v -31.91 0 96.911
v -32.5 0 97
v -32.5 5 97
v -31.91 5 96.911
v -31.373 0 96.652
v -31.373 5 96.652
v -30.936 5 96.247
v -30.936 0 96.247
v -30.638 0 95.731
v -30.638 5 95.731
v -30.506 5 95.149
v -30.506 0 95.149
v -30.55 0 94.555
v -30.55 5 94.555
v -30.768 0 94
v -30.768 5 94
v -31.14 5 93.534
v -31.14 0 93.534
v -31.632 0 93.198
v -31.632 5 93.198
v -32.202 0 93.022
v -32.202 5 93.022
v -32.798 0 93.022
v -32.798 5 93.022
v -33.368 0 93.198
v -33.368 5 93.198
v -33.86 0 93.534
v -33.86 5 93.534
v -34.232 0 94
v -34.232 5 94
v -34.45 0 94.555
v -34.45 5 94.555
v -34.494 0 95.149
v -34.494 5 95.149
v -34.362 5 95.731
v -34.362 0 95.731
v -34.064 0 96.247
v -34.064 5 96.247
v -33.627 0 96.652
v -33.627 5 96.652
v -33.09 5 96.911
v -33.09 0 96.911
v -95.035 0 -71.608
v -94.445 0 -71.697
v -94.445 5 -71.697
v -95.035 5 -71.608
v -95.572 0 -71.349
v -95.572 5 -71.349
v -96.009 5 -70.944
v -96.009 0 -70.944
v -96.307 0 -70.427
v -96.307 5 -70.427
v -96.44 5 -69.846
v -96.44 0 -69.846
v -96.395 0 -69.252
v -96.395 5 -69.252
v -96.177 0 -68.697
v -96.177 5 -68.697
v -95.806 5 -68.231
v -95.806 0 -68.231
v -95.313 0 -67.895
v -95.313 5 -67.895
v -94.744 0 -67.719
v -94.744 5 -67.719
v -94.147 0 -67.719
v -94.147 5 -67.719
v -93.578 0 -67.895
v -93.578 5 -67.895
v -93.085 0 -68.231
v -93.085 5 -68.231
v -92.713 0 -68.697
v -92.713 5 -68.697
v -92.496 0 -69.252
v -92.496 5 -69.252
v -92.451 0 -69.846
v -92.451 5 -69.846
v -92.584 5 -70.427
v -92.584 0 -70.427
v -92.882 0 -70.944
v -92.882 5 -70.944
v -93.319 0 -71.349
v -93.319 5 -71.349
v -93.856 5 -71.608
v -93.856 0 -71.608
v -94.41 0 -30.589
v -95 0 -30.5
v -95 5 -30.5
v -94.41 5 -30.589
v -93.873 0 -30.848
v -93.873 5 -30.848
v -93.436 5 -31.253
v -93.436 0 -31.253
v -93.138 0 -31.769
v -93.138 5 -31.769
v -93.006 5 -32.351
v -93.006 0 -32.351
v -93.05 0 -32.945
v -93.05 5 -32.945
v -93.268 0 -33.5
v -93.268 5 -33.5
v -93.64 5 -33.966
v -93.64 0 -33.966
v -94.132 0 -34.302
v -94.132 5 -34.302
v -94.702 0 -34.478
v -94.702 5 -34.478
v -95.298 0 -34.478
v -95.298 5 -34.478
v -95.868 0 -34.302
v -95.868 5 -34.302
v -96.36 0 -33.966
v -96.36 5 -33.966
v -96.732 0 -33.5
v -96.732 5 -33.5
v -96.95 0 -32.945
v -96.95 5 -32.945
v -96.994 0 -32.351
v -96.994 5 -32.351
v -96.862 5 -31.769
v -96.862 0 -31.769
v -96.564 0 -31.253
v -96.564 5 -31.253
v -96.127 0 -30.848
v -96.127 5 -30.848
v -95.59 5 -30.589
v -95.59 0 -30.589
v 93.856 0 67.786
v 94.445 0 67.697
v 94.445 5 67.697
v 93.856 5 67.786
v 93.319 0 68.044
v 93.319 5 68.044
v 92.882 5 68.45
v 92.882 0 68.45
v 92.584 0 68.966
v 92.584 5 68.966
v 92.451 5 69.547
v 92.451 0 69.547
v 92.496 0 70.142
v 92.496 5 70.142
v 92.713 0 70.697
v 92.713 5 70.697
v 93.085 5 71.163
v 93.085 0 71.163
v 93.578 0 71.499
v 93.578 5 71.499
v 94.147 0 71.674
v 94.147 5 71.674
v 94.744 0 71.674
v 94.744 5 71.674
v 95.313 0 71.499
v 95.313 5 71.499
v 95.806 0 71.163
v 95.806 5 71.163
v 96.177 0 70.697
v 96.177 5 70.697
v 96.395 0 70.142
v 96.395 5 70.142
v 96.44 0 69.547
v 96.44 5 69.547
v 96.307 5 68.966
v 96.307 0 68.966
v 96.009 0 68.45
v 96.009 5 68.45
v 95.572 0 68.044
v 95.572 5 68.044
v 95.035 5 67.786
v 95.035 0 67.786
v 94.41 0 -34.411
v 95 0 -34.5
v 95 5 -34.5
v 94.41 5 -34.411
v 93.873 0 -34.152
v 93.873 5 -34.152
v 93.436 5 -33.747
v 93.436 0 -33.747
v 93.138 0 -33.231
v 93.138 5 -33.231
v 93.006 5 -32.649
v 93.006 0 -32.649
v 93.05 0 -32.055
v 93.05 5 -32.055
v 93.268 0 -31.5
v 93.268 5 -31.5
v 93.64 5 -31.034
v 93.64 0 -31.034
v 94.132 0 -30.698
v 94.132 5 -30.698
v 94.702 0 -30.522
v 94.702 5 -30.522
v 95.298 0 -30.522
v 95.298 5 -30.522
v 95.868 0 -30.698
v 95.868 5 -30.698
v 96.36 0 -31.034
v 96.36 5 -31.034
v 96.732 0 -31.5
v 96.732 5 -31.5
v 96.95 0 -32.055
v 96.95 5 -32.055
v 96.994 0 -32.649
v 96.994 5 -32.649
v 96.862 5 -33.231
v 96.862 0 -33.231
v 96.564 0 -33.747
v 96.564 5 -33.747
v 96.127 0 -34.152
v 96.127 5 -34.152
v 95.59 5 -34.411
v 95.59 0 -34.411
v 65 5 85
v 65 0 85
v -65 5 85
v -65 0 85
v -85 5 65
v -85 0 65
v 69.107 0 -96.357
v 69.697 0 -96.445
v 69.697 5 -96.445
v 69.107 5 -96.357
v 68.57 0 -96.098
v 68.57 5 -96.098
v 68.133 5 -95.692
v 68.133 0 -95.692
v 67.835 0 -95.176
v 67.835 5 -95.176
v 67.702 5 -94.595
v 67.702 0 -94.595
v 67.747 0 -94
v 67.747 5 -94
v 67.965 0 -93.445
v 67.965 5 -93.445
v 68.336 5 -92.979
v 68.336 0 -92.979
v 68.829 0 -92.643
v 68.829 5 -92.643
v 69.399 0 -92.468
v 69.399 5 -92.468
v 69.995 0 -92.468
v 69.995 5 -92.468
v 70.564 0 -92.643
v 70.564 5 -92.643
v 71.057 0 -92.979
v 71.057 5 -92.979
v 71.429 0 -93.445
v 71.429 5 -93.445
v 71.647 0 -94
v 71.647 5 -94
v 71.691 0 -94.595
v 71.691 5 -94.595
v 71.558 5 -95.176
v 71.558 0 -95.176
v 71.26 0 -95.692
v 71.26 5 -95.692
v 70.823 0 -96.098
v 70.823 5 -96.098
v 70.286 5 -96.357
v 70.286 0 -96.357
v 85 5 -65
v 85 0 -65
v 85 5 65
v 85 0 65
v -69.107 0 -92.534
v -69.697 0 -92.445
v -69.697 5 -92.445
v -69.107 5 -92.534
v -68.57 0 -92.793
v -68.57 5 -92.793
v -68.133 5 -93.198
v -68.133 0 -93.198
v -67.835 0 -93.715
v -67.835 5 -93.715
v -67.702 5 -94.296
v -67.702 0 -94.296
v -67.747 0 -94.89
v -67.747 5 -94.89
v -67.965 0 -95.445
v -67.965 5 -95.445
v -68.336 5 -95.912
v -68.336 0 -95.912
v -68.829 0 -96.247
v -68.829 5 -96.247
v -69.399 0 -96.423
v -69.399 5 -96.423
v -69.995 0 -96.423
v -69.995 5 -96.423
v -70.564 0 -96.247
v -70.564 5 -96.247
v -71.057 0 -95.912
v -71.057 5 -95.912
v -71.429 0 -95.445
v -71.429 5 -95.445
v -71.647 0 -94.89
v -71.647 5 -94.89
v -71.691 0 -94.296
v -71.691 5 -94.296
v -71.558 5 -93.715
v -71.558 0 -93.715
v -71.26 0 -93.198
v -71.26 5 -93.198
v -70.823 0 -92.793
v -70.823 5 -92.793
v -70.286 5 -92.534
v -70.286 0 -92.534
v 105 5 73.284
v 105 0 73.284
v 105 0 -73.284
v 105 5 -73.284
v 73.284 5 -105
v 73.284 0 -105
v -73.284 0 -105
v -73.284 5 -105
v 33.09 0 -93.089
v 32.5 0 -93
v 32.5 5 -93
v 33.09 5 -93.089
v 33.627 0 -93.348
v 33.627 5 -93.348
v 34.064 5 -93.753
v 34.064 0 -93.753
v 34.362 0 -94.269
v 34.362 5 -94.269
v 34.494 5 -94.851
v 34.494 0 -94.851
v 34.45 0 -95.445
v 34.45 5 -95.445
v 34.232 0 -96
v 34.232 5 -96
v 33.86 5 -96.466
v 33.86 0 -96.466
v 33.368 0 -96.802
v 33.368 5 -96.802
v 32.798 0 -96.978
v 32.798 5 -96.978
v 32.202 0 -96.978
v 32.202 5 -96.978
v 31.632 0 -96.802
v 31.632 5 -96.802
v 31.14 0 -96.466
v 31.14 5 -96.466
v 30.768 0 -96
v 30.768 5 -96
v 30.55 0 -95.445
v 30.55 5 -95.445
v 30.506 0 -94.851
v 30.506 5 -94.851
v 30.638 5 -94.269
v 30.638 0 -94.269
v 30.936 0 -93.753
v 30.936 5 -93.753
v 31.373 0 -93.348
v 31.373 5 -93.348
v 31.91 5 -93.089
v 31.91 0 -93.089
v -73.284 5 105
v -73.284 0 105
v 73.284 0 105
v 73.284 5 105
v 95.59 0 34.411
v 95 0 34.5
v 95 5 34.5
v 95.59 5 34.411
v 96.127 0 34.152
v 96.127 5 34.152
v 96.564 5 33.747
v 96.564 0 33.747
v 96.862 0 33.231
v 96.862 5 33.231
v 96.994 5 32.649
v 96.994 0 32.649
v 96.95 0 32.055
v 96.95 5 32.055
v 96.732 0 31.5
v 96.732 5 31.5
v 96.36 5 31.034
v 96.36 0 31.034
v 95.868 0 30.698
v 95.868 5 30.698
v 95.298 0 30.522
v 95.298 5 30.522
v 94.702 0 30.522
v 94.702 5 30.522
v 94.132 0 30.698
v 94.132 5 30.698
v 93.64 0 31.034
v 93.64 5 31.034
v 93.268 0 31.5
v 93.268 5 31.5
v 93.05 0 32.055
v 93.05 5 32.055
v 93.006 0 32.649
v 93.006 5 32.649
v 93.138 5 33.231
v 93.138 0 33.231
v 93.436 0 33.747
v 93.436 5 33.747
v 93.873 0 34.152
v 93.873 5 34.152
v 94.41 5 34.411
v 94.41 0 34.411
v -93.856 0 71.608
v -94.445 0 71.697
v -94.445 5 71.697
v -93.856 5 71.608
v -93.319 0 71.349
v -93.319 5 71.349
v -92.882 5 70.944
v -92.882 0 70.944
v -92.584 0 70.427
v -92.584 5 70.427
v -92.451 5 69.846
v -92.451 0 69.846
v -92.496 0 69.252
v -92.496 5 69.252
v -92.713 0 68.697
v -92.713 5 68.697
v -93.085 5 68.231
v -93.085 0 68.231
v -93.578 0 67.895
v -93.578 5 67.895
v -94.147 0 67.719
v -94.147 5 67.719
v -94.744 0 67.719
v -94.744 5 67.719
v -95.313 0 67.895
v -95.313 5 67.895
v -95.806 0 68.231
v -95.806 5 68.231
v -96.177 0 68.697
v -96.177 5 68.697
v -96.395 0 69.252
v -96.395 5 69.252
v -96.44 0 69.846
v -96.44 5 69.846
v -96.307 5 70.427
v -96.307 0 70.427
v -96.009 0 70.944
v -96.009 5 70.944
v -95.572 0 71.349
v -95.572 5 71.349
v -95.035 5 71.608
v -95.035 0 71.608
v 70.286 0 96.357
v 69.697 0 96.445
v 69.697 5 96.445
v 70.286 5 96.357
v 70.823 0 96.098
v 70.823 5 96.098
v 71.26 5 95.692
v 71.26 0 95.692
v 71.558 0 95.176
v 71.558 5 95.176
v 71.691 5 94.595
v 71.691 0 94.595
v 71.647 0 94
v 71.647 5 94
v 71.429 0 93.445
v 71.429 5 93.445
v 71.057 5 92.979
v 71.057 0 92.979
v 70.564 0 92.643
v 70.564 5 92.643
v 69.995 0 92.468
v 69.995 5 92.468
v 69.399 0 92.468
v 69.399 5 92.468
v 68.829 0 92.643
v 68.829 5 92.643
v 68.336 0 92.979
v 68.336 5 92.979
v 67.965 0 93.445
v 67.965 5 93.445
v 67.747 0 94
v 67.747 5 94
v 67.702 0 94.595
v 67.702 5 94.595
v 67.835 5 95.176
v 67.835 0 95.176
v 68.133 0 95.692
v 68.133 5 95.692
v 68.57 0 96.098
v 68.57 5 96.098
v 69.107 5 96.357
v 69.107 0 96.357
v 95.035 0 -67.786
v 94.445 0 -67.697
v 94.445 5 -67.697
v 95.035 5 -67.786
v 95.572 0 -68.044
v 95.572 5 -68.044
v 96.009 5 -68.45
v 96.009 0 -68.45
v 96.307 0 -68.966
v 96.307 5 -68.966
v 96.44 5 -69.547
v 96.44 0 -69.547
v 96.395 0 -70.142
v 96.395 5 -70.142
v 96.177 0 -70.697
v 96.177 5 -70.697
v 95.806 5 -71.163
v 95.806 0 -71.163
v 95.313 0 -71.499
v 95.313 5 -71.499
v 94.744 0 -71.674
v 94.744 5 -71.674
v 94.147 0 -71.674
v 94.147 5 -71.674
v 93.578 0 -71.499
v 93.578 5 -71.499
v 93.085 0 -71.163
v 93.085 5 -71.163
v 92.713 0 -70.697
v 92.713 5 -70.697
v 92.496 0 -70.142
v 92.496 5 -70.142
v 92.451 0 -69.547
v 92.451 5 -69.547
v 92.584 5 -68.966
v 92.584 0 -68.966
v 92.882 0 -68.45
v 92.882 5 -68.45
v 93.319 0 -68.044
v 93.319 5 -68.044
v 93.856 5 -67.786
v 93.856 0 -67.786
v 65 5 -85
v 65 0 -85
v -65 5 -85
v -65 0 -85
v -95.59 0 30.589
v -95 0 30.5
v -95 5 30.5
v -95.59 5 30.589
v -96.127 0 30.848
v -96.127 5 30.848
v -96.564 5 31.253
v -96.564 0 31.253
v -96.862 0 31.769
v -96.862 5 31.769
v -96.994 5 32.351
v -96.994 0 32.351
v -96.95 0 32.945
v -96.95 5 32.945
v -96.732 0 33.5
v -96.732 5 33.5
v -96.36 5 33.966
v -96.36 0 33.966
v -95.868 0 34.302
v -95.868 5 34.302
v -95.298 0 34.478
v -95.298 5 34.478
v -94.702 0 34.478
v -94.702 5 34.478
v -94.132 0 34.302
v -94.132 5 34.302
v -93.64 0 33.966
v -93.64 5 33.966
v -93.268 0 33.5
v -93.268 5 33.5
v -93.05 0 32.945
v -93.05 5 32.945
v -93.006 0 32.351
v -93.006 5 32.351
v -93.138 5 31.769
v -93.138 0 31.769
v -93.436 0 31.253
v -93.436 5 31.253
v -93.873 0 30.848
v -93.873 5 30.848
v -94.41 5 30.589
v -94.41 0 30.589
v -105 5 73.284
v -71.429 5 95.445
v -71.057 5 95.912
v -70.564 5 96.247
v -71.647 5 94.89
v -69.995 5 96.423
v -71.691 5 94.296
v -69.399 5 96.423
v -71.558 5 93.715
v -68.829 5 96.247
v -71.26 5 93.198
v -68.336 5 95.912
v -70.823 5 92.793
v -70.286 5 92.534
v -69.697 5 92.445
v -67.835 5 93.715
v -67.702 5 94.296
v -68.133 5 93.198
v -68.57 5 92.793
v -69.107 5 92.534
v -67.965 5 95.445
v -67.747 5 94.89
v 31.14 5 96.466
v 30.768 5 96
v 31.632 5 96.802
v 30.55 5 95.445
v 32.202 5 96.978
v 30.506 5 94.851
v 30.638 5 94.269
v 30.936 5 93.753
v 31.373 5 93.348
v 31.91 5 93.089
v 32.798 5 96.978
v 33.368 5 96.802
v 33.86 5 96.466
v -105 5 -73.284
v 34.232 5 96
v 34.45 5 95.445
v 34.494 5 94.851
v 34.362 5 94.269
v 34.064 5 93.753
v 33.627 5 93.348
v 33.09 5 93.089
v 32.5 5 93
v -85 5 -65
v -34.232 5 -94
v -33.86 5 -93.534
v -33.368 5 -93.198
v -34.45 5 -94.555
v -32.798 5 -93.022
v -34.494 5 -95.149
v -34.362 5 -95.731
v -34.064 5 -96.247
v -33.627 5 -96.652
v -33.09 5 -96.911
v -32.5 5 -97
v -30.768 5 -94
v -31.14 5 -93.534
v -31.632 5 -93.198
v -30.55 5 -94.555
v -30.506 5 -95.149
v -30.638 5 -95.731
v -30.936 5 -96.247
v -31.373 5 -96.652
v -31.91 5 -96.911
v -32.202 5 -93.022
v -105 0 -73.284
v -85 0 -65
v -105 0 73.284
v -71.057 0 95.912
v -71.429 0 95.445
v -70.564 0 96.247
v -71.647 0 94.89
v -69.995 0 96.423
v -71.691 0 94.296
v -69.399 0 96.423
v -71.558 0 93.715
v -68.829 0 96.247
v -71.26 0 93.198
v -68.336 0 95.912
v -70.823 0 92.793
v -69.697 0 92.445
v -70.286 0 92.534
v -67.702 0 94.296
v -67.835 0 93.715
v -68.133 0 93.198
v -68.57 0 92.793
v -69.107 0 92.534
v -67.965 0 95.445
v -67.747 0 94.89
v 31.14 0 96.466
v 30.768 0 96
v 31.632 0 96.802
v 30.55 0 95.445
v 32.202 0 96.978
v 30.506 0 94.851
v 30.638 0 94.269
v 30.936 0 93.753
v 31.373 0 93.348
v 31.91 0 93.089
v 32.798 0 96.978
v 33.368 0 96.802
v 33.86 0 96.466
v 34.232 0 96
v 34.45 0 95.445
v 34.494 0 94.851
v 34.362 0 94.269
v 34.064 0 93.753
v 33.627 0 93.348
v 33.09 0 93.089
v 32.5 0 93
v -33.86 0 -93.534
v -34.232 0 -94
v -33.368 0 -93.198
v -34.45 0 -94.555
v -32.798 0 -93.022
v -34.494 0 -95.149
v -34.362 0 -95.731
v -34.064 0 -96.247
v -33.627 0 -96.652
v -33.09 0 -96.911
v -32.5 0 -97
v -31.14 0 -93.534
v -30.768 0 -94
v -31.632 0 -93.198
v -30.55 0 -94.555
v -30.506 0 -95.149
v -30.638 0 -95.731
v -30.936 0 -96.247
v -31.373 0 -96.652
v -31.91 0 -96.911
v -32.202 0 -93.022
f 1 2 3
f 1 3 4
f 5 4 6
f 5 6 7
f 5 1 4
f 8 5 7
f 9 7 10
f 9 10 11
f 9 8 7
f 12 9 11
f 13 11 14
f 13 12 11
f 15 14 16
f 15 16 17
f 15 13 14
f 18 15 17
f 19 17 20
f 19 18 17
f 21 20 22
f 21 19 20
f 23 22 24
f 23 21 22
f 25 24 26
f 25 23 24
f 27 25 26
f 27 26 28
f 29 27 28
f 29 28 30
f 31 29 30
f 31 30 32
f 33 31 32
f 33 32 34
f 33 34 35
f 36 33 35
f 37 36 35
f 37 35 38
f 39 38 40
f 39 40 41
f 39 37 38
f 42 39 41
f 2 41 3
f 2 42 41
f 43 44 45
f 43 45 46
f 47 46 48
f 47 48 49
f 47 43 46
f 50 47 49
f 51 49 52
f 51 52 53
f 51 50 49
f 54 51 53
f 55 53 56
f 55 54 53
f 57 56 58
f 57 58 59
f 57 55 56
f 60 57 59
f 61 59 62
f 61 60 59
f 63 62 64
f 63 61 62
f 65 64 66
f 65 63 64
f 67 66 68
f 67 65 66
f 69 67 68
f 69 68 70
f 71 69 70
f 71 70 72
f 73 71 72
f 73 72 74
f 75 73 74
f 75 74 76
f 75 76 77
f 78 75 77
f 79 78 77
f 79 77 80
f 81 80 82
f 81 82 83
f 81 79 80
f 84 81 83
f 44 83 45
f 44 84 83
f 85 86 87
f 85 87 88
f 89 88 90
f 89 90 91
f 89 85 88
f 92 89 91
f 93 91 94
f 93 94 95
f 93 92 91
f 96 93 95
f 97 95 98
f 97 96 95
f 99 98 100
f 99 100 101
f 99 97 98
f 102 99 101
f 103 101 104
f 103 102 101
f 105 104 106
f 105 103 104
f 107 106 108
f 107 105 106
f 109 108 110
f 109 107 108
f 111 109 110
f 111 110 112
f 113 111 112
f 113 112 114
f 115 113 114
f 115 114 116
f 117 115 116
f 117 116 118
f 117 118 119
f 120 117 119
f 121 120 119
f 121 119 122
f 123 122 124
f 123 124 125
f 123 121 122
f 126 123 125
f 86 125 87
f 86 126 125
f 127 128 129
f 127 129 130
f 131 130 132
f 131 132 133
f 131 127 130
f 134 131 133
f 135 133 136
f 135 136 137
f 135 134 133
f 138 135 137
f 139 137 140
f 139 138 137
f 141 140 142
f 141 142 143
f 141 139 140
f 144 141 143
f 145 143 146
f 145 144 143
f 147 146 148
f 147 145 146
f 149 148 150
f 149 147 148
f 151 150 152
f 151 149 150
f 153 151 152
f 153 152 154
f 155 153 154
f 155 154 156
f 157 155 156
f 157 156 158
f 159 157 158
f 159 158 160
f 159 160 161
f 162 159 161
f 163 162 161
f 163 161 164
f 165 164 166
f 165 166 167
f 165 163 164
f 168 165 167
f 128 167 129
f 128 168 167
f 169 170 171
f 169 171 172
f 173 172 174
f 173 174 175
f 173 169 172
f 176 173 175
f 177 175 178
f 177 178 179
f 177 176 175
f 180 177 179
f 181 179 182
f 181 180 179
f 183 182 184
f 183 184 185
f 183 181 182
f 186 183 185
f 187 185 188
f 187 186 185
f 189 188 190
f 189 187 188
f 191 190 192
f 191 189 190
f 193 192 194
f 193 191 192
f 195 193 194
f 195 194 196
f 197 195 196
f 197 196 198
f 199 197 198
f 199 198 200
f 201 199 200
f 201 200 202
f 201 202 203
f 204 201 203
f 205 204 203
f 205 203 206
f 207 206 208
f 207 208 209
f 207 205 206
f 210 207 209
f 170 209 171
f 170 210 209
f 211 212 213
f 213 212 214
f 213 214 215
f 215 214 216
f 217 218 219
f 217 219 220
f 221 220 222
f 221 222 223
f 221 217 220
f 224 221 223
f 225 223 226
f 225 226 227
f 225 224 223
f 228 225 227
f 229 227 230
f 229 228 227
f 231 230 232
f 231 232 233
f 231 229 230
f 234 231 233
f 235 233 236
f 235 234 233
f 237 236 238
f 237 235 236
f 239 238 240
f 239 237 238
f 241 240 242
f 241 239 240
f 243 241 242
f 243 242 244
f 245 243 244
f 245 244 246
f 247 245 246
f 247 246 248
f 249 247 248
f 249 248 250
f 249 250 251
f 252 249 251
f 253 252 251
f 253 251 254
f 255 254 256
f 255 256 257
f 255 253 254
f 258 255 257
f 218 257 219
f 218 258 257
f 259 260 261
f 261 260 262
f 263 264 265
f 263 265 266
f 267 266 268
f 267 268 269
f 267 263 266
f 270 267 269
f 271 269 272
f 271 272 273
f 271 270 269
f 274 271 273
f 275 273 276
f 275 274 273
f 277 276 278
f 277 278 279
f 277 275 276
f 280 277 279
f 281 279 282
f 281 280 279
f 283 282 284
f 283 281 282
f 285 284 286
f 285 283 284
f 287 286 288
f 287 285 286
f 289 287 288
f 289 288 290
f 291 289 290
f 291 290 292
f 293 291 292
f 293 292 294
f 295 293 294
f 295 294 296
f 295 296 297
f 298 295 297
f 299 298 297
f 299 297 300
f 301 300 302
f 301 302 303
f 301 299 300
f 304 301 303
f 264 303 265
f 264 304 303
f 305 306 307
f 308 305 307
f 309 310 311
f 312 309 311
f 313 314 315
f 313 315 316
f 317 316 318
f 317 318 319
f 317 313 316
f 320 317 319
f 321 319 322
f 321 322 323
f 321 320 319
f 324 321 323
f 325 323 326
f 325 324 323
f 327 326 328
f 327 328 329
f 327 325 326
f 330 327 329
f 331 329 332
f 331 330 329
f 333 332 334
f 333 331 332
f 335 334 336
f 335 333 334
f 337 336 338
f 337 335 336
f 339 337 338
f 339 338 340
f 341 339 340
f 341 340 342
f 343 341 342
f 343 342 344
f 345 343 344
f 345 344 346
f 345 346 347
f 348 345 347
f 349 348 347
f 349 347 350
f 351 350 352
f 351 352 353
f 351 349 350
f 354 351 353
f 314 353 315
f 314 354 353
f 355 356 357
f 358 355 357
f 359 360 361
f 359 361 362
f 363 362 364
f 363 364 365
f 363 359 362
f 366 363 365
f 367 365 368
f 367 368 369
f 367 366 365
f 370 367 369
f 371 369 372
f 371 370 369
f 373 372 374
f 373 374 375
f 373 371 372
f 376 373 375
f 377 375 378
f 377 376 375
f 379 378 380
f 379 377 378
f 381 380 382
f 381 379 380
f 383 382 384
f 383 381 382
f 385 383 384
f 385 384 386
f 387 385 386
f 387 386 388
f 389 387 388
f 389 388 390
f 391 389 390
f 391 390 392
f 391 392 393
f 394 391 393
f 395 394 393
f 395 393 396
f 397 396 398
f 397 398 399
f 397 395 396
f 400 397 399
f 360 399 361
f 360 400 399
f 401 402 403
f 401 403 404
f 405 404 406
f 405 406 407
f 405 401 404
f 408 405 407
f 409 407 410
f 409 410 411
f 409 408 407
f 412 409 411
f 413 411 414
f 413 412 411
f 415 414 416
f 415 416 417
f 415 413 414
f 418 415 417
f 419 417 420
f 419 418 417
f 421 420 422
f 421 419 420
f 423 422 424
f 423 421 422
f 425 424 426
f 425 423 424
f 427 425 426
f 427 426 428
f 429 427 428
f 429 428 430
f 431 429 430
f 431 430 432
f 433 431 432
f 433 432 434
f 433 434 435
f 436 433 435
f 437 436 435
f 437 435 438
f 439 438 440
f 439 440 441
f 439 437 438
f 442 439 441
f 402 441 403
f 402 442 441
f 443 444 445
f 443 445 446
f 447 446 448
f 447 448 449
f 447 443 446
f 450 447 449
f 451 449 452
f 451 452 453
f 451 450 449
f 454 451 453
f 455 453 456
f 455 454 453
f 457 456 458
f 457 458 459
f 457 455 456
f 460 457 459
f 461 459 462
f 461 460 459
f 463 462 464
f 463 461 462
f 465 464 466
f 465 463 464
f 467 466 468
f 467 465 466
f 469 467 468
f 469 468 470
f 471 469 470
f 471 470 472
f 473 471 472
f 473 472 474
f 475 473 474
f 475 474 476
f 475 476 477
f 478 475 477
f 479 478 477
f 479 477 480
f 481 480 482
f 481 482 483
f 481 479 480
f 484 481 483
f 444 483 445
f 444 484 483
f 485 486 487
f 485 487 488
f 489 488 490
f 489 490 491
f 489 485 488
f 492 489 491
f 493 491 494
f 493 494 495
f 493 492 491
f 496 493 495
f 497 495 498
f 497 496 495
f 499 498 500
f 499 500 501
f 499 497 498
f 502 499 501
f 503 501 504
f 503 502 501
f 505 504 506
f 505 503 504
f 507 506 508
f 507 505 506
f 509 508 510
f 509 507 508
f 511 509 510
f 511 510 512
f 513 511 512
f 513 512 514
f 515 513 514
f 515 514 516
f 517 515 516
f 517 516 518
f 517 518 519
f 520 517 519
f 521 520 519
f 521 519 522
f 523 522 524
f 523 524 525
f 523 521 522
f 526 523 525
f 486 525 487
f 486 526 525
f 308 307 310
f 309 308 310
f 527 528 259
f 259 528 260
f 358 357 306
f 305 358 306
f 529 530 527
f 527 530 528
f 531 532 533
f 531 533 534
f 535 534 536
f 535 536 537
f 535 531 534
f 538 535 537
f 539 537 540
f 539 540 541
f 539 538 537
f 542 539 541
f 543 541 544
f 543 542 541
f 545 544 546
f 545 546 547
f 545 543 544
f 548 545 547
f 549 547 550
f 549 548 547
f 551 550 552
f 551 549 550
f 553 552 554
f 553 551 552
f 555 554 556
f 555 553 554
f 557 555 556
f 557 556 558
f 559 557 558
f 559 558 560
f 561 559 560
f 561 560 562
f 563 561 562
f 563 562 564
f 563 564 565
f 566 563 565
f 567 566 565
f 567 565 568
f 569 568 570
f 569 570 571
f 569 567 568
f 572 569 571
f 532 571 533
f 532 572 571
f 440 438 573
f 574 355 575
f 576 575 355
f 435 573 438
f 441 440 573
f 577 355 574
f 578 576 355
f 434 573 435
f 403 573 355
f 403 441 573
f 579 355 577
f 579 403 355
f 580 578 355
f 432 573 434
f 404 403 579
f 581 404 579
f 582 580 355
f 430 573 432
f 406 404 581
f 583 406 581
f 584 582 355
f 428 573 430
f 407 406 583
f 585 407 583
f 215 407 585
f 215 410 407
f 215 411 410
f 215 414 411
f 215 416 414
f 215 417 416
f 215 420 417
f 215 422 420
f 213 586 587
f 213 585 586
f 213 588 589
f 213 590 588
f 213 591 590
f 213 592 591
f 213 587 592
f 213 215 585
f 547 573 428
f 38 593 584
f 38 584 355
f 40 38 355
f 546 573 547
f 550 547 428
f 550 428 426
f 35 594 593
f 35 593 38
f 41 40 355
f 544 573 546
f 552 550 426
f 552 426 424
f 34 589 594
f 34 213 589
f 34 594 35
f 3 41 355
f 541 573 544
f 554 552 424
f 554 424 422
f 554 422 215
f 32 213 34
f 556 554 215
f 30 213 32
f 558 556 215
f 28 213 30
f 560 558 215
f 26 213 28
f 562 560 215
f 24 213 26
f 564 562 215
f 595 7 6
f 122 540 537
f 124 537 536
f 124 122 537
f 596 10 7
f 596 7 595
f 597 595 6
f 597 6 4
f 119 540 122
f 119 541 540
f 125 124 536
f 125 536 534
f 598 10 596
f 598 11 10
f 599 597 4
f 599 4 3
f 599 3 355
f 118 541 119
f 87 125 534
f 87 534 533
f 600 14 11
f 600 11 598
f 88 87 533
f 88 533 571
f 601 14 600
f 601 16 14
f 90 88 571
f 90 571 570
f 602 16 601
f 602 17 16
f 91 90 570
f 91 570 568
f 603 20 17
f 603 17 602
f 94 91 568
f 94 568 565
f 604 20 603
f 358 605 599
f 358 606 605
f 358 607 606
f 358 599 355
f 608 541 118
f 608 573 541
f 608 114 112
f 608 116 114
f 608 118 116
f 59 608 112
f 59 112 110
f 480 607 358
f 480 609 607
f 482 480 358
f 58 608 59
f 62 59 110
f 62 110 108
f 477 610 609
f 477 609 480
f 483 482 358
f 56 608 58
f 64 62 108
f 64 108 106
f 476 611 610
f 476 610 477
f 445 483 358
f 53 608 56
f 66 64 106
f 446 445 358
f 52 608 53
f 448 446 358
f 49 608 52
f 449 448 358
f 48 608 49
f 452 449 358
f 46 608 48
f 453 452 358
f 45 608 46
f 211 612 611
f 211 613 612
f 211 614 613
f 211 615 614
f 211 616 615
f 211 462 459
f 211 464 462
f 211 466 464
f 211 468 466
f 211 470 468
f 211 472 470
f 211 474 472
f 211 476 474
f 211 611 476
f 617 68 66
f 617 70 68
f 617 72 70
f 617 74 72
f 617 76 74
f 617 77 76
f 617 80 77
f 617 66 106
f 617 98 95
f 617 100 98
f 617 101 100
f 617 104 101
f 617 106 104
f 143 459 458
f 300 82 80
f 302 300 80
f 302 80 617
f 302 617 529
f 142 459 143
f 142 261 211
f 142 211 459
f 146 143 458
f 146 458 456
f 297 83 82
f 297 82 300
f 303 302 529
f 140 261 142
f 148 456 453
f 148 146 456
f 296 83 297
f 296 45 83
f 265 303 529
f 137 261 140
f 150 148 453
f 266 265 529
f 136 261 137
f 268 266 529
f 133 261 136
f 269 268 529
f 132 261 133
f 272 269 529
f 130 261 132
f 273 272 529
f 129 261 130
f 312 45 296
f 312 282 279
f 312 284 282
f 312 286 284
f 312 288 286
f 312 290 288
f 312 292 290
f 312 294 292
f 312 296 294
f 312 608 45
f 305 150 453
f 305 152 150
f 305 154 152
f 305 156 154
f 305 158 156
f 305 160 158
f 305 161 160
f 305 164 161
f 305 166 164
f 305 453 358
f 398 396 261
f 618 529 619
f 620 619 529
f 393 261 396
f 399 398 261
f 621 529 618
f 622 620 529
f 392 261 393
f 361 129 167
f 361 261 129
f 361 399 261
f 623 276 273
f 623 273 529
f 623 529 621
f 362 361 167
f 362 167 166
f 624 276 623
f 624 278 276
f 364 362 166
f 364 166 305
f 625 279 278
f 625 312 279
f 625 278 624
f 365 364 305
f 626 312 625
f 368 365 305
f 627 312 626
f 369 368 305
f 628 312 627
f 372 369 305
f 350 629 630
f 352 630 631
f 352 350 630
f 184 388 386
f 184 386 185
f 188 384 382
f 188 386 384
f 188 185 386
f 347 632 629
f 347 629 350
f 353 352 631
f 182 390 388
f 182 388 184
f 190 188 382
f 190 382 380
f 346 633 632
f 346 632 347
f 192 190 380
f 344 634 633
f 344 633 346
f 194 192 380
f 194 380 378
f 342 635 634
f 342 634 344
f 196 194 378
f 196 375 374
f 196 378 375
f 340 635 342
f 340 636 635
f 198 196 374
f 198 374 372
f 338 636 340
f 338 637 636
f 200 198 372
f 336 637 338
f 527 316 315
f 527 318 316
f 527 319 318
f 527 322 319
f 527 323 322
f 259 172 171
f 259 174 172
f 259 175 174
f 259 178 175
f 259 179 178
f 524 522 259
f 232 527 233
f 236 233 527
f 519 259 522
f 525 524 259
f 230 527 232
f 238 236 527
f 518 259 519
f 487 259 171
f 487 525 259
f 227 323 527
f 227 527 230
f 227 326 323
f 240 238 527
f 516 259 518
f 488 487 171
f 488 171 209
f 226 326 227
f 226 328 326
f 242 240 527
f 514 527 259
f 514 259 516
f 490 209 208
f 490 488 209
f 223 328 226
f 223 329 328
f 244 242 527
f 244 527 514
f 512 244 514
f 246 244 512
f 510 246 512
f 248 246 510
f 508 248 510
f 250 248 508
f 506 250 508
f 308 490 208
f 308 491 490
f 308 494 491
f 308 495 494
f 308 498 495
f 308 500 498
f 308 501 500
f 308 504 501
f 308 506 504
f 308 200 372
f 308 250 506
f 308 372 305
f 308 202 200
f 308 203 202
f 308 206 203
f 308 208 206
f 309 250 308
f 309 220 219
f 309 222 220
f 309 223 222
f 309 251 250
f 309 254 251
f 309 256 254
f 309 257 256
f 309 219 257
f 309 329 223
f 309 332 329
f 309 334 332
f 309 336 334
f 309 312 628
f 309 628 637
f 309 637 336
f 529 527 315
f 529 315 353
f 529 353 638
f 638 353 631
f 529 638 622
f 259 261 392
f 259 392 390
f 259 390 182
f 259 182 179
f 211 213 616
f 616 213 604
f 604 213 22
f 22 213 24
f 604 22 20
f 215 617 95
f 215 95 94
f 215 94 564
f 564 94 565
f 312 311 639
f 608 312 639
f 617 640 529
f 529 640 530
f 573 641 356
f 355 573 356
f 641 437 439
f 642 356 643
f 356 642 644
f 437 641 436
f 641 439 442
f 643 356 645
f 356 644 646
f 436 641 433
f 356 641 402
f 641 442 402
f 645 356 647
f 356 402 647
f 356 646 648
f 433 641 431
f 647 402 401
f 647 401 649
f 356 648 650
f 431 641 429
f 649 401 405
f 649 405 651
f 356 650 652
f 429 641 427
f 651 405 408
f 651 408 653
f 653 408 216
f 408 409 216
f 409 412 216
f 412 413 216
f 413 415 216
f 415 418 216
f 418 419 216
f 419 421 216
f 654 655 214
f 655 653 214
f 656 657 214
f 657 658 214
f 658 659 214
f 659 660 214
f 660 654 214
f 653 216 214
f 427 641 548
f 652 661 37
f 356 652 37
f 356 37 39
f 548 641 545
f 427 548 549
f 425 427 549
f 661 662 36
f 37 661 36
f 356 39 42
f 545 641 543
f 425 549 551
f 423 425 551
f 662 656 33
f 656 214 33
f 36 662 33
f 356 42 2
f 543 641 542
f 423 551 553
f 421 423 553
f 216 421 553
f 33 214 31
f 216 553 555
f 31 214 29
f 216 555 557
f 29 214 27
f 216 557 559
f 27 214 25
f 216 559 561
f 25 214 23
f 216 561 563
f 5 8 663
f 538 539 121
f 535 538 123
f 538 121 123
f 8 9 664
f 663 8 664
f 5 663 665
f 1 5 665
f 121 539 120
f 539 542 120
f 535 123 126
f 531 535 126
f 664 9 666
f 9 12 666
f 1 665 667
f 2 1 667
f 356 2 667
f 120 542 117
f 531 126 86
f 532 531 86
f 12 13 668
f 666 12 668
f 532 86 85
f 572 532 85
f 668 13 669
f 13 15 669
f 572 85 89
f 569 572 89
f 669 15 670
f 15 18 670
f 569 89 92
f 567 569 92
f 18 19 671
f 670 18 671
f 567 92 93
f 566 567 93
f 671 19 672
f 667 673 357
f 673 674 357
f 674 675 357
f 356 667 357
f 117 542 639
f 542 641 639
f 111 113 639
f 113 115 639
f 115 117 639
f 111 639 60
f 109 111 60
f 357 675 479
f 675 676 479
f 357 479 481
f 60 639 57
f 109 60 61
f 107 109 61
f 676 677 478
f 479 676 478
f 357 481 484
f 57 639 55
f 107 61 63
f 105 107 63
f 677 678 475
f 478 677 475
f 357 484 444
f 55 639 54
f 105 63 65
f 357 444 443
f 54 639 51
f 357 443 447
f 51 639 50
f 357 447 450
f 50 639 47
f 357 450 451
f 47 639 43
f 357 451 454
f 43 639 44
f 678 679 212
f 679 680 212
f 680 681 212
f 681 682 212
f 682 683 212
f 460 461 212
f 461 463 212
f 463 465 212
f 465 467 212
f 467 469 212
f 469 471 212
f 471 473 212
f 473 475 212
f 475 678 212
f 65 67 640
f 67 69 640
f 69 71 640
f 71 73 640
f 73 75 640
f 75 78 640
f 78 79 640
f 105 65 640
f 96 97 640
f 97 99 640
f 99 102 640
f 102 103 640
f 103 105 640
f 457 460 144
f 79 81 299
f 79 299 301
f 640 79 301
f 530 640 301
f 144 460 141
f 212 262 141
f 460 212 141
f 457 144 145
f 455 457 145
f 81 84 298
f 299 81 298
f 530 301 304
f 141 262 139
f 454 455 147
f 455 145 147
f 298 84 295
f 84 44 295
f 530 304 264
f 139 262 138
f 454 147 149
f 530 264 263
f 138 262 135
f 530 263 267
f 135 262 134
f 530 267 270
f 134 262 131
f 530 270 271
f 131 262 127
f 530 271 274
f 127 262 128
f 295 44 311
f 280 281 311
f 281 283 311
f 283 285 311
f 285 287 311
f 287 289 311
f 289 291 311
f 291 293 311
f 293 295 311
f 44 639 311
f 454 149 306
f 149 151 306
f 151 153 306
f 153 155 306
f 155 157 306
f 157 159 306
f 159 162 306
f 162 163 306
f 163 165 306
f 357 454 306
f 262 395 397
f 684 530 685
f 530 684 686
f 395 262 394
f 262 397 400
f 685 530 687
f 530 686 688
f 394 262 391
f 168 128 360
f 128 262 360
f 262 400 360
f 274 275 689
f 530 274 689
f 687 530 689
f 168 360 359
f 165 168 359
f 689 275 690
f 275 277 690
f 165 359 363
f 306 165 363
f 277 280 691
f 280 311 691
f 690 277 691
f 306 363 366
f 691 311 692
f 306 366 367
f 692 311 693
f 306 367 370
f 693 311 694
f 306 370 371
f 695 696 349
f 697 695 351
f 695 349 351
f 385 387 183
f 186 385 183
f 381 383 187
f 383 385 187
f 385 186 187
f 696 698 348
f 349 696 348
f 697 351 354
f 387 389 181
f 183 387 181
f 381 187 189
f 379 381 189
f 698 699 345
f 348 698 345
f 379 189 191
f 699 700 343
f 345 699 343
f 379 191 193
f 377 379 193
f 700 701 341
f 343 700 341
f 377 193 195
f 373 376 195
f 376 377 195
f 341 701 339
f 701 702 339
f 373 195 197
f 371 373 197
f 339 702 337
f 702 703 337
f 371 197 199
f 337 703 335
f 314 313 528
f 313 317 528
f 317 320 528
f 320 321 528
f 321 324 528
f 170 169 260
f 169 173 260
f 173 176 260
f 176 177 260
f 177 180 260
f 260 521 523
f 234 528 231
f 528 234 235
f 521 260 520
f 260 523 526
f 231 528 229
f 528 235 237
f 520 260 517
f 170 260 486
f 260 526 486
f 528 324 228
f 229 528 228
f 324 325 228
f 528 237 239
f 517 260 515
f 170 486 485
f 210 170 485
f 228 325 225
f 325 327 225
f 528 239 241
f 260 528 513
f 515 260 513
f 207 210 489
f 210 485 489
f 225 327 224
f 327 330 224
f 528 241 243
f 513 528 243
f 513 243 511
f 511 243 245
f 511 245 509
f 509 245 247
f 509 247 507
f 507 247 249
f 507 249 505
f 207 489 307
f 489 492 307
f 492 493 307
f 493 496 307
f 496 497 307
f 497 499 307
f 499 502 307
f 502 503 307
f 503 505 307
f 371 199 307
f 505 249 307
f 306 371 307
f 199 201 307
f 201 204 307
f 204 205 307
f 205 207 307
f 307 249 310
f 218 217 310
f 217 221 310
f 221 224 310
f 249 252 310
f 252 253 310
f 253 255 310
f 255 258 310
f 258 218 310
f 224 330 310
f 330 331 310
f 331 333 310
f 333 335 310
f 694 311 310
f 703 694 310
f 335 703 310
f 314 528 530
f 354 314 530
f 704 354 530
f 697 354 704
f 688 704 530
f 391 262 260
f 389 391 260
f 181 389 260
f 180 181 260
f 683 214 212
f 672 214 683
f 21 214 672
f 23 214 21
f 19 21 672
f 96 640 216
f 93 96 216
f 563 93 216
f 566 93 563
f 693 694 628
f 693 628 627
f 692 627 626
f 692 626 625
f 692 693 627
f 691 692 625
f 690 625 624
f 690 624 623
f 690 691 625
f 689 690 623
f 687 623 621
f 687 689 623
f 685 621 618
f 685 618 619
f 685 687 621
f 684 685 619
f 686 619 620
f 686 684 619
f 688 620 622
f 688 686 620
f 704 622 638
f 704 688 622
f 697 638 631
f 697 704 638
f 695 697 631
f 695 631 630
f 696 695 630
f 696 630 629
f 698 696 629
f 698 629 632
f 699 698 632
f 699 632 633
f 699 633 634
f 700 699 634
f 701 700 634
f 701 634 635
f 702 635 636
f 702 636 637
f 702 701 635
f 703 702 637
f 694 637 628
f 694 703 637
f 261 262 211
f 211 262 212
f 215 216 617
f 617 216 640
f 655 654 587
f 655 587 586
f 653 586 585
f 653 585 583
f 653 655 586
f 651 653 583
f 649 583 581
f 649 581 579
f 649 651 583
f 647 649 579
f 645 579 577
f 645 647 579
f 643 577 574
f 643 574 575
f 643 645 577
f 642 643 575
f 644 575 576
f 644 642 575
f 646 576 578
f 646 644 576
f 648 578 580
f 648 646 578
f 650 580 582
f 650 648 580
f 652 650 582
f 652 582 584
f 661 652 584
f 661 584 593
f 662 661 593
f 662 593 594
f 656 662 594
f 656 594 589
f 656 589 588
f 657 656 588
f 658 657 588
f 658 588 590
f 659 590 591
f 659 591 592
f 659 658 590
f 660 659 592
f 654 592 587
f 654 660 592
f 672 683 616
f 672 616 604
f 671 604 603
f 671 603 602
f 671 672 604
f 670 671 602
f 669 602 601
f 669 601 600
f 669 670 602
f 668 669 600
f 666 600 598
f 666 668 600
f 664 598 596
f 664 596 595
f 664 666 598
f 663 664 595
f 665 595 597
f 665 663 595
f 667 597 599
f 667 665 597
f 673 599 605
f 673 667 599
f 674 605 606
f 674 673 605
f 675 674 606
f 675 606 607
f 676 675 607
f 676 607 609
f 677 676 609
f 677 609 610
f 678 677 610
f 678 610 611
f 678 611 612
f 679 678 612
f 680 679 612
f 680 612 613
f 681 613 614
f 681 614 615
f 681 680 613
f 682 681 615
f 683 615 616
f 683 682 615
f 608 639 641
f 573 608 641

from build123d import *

# Parameters (mm, degrees)
SKETCH1_R           = 2
BOSS_EXTRUDE1_DEPTH = 5


with BuildPart() as part:
    # Sketch1 → Boss-Extrude1 (new body)
    with BuildSketch(Plane(origin=(0, 0, 0), x_dir=(1, 0, 0), z_dir=(0, 1, 0))):
        Polygon((105, -73.284271247), (105, 73.284271247), (73.284271247, 105), (-73.284271247, 105), (-105, 73.284271247), (-105, -73.284271247), (-73.284271247, -105), (73.284271247, -105), align=None)
        with Locations(Location((-95, 32.5, 0), (0, 0, 270))):
            Circle(SKETCH1_R, mode=Mode.SUBTRACT)
        with Locations(Location((-95, -32.5, 0), (0, 0, 90))):
            Circle(SKETCH1_R, mode=Mode.SUBTRACT)
        with Locations(Location((32.5, 95, 0), (0, 0, 270))):
            Circle(SKETCH1_R, mode=Mode.SUBTRACT)
        with Locations(Location((-32.5, 95, 0), (0, 0, 90))):
            Circle(SKETCH1_R, mode=Mode.SUBTRACT)
        with Locations(Location((-32.5, -95, 0), (0, 0, 270))):
            Circle(SKETCH1_R, mode=Mode.SUBTRACT)
        with Locations(Location((32.5, -95, 0), (0, 0, 90))):
            Circle(SKETCH1_R, mode=Mode.SUBTRACT)
        with Locations(Location((95, -32.5, 0), (0, 0, 270))):
            Circle(SKETCH1_R, mode=Mode.SUBTRACT)
        with Locations(Location((95, 32.5, 0), (0, 0, 90))):
            Circle(SKETCH1_R, mode=Mode.SUBTRACT)
        with Locations(Location((-94.445436483, -69.696699141, 0), (0, 0, 270))):
            Circle(SKETCH1_R, mode=Mode.SUBTRACT)
        with Locations(Location((-69.696699141, -94.445436483, 0), (0, 0, 90))):
            Circle(SKETCH1_R, mode=Mode.SUBTRACT)
        with Locations(Location((69.696699141, -94.445436483, 0), (0, 0, 270))):
            Circle(SKETCH1_R, mode=Mode.SUBTRACT)
        with Locations(Location((94.445436483, -69.696699141, 0), (0, 0, 90))):
            Circle(SKETCH1_R, mode=Mode.SUBTRACT)
        with Locations(Location((-94.445436483, 69.696699141, 0), (0, 0, 90))):
            Circle(SKETCH1_R, mode=Mode.SUBTRACT)
        with Locations(Location((-69.696699141, 94.445436483, 0), (0, 0, 270))):
            Circle(SKETCH1_R, mode=Mode.SUBTRACT)
        with Locations(Location((69.696699141, 94.445436483, 0), (0, 0, 90))):
            Circle(SKETCH1_R, mode=Mode.SUBTRACT)
        with Locations(Location((94.445436483, 69.696699141, 0), (0, 0, 270))):
            Circle(SKETCH1_R, mode=Mode.SUBTRACT)
        Polygon((65, 85), (85, 65), (85, -65), (65, -85), (-65, -85), (-85, -65), (-85, 65), (-65, 85), align=None, mode=Mode.SUBTRACT)
    extrude(amount=BOSS_EXTRUDE1_DEPTH)


solid = part.part
